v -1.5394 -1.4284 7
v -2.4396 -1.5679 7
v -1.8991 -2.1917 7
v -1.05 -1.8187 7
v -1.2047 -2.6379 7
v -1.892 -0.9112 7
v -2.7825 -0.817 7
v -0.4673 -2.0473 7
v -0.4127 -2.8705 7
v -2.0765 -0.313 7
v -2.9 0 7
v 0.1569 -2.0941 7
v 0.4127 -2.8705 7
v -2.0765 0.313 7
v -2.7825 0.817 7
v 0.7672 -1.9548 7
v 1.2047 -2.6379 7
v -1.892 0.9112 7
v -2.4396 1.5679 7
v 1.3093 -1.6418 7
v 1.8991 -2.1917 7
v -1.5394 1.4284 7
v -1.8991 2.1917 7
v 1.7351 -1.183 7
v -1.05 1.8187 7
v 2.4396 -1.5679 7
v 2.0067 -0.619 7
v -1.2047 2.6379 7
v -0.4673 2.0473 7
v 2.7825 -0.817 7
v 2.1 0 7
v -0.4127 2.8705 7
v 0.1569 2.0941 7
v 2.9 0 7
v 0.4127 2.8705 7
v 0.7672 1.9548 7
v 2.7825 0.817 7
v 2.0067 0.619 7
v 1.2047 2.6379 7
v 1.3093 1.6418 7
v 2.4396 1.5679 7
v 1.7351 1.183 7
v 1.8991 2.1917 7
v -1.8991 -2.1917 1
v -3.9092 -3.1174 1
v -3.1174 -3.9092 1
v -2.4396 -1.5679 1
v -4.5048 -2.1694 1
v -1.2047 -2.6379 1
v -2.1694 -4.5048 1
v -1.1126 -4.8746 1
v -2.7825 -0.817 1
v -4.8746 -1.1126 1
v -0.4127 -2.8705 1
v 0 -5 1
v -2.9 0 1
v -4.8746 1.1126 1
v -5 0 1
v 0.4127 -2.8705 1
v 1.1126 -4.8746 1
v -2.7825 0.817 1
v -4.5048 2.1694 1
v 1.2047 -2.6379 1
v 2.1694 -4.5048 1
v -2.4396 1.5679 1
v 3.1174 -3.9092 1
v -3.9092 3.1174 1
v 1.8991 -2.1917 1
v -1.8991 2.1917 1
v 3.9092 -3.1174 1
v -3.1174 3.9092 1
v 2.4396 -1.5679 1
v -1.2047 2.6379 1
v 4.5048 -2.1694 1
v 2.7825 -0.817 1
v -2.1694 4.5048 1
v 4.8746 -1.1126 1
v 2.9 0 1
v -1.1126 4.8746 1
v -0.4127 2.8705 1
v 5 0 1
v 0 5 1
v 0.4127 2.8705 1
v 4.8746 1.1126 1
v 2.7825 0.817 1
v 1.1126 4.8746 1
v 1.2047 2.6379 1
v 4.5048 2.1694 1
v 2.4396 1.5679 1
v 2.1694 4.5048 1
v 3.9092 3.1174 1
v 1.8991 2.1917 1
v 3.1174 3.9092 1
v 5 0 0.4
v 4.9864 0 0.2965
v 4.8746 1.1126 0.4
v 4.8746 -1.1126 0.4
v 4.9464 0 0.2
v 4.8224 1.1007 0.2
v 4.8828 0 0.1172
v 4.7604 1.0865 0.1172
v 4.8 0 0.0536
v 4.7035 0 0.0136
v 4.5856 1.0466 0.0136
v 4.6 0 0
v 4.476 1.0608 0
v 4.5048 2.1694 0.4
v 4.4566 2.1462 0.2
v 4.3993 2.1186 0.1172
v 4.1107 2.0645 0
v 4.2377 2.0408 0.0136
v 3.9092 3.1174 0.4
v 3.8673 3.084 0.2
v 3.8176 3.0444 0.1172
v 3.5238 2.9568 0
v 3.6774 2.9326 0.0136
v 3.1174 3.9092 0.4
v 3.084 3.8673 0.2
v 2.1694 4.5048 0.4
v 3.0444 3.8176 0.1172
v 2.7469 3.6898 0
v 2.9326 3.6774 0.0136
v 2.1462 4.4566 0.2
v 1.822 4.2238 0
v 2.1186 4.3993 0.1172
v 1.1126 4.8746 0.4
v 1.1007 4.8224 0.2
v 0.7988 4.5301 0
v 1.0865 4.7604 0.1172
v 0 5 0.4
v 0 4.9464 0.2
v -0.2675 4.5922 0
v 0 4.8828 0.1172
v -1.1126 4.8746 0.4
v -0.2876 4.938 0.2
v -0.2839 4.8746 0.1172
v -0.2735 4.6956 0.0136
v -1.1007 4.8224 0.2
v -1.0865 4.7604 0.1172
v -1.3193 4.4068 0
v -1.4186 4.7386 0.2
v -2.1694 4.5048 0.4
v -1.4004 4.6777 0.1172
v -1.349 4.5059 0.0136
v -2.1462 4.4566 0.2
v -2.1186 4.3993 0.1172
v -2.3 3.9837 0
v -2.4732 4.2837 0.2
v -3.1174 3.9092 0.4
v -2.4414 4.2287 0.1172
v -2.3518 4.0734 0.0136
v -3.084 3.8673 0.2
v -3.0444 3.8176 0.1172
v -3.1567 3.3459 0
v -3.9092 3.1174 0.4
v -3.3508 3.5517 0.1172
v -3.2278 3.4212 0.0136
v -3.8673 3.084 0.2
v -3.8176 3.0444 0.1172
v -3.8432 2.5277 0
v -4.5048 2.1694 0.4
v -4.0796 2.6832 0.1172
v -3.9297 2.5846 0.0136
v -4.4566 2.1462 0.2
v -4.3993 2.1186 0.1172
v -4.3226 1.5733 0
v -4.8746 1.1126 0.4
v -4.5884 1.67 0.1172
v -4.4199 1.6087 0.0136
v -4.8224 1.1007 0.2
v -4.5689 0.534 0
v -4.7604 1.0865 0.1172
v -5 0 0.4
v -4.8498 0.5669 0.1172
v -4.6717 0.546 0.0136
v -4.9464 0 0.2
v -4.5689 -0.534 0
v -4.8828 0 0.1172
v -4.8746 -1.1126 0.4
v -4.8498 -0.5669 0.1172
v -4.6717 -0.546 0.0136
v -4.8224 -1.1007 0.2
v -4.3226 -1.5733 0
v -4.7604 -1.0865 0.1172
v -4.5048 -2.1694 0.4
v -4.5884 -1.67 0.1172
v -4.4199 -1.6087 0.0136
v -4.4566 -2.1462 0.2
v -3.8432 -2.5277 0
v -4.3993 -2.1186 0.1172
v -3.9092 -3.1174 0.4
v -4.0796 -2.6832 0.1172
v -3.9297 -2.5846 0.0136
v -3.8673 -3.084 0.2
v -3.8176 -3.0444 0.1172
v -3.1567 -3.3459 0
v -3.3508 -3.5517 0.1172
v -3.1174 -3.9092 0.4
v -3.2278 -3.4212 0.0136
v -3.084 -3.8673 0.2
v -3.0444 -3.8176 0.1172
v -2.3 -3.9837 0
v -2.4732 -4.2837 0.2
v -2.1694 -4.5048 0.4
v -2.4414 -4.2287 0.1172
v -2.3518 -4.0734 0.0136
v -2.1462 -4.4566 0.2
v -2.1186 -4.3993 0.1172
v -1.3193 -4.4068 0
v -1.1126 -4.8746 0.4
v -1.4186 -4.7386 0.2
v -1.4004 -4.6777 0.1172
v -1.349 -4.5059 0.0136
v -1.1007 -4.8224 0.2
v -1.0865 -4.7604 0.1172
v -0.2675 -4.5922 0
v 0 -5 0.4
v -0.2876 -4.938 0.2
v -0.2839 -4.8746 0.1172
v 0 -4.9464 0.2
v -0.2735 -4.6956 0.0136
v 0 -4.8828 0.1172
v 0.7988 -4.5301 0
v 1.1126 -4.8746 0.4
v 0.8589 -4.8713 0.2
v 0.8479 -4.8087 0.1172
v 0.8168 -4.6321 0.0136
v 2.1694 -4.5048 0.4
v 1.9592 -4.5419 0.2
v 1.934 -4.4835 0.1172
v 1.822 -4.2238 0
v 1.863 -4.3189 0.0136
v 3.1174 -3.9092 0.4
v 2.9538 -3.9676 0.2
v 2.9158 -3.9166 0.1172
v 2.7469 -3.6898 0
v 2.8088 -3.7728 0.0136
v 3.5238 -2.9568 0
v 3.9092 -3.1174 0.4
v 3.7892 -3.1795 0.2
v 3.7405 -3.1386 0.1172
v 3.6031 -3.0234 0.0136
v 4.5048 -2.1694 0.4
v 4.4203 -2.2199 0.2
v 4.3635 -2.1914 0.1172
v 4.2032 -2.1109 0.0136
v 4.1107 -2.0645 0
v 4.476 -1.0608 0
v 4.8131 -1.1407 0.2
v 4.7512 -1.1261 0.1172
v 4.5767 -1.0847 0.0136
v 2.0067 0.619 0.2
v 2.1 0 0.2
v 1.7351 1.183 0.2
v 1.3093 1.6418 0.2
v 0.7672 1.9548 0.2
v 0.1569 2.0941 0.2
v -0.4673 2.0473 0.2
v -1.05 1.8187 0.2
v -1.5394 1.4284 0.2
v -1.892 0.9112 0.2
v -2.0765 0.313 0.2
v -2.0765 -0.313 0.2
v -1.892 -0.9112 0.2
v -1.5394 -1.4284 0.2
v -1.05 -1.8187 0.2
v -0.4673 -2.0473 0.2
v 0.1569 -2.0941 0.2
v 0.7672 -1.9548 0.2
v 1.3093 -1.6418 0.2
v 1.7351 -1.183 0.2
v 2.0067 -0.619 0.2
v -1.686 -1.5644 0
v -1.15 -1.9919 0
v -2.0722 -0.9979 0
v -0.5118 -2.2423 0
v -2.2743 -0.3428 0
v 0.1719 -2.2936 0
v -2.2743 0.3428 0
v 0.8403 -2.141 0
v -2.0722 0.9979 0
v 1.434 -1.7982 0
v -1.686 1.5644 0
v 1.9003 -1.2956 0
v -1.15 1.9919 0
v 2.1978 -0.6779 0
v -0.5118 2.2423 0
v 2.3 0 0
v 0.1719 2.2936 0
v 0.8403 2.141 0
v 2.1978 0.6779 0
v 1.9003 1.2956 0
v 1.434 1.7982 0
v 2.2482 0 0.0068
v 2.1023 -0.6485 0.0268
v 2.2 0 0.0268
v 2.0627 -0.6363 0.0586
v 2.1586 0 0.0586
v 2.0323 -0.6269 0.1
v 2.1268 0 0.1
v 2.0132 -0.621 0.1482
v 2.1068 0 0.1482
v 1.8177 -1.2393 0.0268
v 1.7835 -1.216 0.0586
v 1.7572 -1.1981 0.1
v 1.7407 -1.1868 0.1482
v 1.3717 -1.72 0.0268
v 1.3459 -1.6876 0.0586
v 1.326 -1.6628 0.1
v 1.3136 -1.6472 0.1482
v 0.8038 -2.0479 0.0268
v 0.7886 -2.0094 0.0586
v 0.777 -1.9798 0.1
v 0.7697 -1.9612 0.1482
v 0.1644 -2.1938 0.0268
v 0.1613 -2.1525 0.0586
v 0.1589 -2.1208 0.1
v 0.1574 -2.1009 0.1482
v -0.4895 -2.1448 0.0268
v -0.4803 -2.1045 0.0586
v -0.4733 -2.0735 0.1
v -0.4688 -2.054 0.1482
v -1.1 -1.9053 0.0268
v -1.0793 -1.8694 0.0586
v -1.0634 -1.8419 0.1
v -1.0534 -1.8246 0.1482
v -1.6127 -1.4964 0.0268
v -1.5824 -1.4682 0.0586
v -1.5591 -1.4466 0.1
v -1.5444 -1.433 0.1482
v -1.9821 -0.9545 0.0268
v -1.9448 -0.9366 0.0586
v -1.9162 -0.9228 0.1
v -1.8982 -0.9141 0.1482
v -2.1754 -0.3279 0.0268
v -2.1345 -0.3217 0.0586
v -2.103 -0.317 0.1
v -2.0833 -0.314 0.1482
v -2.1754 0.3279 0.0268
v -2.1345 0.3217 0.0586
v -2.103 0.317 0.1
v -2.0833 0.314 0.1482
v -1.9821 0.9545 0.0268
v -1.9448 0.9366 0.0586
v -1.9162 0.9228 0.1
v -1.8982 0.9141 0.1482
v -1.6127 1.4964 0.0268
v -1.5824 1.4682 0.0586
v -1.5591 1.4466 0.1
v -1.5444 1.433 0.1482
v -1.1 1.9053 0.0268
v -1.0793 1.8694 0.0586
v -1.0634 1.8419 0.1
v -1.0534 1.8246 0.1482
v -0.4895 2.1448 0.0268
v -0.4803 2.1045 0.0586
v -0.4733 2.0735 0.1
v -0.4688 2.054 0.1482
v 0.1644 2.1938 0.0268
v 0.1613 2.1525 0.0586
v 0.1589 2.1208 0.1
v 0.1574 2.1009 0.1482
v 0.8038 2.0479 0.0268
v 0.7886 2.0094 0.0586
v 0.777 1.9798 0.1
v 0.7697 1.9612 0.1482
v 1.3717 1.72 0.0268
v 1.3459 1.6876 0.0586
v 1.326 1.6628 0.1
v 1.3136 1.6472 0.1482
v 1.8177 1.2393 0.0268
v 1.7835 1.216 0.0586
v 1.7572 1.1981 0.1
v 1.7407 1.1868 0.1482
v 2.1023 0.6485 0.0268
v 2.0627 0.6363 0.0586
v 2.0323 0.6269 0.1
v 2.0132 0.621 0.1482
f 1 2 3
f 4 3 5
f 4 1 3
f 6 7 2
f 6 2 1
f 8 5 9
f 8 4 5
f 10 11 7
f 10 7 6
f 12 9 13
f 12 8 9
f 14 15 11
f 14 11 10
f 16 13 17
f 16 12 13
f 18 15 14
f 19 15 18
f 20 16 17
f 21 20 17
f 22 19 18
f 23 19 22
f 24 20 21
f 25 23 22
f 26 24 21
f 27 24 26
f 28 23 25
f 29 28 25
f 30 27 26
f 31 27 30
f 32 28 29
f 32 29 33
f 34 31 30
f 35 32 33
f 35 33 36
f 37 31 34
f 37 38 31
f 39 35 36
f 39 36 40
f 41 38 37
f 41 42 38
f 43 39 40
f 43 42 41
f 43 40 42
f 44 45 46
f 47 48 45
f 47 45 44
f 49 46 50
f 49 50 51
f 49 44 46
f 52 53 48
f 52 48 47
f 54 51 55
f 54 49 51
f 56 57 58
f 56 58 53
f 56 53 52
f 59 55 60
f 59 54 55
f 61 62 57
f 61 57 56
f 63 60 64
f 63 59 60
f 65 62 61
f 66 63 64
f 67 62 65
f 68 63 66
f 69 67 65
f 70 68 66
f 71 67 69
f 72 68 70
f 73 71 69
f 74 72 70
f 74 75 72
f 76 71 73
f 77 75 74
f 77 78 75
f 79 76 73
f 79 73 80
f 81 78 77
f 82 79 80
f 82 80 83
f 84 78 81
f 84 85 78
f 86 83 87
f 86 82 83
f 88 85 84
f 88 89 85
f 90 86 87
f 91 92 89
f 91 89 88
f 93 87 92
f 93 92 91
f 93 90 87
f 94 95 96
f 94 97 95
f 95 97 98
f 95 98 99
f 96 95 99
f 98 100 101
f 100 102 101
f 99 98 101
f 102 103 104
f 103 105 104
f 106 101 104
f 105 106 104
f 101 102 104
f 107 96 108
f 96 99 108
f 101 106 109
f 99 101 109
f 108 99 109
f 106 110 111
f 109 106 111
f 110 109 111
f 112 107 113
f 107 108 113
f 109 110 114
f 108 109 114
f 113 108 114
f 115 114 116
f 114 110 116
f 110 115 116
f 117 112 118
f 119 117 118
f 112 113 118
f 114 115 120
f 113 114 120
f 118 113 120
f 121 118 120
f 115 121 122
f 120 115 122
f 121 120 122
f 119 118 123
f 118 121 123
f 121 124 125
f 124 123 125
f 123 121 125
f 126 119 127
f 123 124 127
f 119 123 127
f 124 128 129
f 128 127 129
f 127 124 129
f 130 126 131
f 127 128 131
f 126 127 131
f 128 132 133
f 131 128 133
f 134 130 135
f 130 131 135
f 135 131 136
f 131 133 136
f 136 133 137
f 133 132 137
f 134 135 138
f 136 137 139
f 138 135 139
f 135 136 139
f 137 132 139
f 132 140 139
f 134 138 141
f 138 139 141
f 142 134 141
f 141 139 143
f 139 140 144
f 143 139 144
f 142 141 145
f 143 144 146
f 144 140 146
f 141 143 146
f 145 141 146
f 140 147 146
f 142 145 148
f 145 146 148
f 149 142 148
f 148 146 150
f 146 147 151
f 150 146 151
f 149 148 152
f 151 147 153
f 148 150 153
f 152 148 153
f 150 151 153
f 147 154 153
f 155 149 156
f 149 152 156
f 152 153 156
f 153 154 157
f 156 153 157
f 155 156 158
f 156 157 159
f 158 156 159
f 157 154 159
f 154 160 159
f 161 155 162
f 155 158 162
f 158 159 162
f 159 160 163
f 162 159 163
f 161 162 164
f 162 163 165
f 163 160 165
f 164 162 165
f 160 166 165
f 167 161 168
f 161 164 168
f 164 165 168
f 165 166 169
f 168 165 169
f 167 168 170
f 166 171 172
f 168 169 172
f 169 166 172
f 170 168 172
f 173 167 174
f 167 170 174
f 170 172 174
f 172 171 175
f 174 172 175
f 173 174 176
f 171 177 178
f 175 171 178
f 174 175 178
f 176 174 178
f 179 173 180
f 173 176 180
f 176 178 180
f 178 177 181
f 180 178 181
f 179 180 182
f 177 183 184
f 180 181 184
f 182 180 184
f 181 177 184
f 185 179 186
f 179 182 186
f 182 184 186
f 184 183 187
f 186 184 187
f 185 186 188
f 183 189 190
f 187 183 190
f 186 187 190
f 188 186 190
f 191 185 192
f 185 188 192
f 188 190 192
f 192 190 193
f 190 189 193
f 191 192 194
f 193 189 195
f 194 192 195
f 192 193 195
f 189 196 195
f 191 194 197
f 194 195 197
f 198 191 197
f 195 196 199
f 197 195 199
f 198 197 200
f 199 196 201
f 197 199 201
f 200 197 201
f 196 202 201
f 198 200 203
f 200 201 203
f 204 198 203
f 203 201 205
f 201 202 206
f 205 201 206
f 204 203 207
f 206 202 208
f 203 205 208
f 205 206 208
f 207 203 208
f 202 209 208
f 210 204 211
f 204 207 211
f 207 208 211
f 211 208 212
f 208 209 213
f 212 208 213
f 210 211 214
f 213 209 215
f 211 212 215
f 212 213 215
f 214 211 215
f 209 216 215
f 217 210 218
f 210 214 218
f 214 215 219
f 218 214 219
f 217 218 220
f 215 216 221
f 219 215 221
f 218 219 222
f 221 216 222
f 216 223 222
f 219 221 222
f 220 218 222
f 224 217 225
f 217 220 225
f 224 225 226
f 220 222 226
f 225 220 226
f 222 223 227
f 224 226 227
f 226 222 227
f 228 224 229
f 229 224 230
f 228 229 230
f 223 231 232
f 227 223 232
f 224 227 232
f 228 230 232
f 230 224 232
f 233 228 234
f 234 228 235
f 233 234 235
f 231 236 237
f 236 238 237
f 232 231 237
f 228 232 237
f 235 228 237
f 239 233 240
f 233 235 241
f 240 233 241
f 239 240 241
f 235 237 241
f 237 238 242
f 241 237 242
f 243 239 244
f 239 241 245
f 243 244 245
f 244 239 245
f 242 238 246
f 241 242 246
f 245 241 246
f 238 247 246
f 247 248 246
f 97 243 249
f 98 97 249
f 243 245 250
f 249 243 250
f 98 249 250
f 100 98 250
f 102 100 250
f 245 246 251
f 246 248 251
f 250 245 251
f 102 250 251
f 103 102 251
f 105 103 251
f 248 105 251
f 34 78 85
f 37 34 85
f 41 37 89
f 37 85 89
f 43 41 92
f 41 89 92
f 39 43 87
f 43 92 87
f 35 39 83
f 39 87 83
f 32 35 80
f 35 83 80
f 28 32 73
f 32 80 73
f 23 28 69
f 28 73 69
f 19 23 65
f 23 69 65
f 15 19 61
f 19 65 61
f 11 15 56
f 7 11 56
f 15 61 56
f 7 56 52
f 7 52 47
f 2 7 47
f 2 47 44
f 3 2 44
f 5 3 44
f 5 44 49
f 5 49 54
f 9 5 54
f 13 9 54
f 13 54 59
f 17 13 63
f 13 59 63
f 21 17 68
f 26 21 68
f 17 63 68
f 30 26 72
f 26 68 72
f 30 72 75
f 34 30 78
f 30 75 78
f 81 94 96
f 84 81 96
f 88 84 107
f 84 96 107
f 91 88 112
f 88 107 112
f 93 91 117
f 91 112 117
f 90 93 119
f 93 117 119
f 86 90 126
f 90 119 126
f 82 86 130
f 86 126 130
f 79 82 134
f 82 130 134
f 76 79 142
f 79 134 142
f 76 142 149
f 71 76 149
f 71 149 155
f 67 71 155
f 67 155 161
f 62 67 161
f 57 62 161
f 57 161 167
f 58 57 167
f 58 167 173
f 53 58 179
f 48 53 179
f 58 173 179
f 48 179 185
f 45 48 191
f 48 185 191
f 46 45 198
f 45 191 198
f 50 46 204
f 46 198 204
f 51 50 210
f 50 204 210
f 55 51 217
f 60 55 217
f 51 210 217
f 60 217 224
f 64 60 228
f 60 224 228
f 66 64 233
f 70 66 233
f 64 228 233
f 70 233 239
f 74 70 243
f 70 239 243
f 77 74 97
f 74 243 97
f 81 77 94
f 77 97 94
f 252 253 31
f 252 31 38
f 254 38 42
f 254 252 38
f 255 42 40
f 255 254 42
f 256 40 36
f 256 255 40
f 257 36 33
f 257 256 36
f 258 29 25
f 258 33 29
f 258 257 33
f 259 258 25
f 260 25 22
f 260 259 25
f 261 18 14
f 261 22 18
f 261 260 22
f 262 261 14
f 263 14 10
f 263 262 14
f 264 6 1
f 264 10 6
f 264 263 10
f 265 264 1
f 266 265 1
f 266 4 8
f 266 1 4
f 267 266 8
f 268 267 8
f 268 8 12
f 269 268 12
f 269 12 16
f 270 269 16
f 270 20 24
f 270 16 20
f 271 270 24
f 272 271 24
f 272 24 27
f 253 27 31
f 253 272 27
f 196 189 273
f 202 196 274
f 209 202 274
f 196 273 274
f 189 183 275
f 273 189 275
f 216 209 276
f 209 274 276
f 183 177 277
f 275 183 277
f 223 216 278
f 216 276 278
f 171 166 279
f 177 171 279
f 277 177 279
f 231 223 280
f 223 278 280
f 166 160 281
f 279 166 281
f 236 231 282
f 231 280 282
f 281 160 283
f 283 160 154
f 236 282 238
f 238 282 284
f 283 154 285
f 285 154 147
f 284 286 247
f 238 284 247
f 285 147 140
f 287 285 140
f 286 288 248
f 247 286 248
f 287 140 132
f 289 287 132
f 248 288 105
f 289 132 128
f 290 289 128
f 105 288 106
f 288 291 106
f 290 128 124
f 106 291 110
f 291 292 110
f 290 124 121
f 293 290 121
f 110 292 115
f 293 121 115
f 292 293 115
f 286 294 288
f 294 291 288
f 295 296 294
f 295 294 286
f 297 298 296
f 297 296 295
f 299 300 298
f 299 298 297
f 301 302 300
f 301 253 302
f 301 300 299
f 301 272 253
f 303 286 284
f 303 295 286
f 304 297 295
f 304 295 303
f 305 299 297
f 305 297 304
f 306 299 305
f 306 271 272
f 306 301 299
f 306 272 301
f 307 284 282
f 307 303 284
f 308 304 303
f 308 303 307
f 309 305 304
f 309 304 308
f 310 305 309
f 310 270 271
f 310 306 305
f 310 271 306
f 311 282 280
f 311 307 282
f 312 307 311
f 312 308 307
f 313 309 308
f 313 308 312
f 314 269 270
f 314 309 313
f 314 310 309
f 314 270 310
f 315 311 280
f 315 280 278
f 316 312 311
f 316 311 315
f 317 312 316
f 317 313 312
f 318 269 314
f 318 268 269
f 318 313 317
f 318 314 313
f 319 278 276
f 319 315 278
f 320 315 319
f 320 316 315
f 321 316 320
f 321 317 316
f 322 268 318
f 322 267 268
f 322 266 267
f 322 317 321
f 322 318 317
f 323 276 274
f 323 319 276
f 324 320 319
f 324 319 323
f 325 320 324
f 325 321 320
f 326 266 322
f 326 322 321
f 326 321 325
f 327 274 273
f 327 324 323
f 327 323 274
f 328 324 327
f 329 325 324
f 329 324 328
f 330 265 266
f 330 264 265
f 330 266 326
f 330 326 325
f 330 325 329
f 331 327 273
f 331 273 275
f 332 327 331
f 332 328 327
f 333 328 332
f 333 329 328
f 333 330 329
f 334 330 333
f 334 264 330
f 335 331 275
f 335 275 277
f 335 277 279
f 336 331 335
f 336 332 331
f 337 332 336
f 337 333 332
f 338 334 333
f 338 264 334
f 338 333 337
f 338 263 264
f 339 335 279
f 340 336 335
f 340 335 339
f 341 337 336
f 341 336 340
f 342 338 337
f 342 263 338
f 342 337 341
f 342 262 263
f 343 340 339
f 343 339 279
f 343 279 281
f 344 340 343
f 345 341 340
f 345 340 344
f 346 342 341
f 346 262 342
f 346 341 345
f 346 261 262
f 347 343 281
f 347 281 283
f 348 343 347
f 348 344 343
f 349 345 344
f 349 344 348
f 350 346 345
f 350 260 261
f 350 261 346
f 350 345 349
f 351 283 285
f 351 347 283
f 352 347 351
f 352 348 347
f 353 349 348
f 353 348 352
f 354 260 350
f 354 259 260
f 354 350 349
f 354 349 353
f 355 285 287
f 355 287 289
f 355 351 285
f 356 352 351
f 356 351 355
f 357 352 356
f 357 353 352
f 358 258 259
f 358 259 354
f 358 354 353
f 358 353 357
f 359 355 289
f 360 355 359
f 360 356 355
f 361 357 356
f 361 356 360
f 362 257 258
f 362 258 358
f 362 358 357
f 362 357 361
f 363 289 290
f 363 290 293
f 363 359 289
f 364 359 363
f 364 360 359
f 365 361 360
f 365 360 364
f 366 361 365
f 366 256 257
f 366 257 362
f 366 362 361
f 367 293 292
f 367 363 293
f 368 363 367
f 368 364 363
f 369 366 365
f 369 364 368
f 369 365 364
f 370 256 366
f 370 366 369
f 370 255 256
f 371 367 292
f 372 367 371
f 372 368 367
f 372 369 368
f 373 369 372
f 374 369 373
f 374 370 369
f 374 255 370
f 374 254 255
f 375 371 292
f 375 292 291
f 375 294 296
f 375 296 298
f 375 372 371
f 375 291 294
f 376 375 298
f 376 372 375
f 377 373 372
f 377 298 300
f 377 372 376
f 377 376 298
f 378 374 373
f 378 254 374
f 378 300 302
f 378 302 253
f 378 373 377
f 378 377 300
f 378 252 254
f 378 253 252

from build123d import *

# Parameters (mm, degrees)
SKETCH1_R               = 5
BOSS_EXTRUDE1_DEPTH     = 1
SKETCH2_R               = 2.9
BOSS_EXTRUDE2_DEPTH     = 6
CUT_EXTRUDE2_DEPTH      = 10.949874371
CUT_EXTRUDE2_DEPTH_BACK = 10.949874371
SKETCH3_R               = 2.1
FILLET1_R               = 0.4
FILLET2_R               = 0.2


with BuildPart() as part:
    # Sketch1 → Boss-Extrude1 (new body)
    with BuildSketch(Plane.XY):
        Circle(SKETCH1_R)
    extrude(amount=BOSS_EXTRUDE1_DEPTH)

    # Sketch2 → Boss-Extrude2 (add)
    with BuildSketch(Plane.XY.offset(1)):
        Circle(SKETCH2_R)
    extrude(amount=BOSS_EXTRUDE2_DEPTH)

    # Sketch3 → Cut-Extrude2 (cut, two sides: drawn at the far end of the back side and taken through both)
    with BuildSketch(Plane.XY.offset(7).offset(-CUT_EXTRUDE2_DEPTH_BACK)):
        Circle(SKETCH3_R)
    extrude(amount=CUT_EXTRUDE2_DEPTH + CUT_EXTRUDE2_DEPTH_BACK, mode=Mode.SUBTRACT)

    # Fillet1
    fillet1_edges = [part.edges().sort_by_distance(p)[0] for p in [
        (-5, 0, 0),
    ]]
    fillet(fillet1_edges, radius=FILLET1_R)

    # Fillet2
    fillet2_edges = [part.edges().sort_by_distance(p)[0] for p in [
        (-2.1, 0, 0),
    ]]
    fillet(fillet2_edges, radius=FILLET2_R)


solid = part.part
